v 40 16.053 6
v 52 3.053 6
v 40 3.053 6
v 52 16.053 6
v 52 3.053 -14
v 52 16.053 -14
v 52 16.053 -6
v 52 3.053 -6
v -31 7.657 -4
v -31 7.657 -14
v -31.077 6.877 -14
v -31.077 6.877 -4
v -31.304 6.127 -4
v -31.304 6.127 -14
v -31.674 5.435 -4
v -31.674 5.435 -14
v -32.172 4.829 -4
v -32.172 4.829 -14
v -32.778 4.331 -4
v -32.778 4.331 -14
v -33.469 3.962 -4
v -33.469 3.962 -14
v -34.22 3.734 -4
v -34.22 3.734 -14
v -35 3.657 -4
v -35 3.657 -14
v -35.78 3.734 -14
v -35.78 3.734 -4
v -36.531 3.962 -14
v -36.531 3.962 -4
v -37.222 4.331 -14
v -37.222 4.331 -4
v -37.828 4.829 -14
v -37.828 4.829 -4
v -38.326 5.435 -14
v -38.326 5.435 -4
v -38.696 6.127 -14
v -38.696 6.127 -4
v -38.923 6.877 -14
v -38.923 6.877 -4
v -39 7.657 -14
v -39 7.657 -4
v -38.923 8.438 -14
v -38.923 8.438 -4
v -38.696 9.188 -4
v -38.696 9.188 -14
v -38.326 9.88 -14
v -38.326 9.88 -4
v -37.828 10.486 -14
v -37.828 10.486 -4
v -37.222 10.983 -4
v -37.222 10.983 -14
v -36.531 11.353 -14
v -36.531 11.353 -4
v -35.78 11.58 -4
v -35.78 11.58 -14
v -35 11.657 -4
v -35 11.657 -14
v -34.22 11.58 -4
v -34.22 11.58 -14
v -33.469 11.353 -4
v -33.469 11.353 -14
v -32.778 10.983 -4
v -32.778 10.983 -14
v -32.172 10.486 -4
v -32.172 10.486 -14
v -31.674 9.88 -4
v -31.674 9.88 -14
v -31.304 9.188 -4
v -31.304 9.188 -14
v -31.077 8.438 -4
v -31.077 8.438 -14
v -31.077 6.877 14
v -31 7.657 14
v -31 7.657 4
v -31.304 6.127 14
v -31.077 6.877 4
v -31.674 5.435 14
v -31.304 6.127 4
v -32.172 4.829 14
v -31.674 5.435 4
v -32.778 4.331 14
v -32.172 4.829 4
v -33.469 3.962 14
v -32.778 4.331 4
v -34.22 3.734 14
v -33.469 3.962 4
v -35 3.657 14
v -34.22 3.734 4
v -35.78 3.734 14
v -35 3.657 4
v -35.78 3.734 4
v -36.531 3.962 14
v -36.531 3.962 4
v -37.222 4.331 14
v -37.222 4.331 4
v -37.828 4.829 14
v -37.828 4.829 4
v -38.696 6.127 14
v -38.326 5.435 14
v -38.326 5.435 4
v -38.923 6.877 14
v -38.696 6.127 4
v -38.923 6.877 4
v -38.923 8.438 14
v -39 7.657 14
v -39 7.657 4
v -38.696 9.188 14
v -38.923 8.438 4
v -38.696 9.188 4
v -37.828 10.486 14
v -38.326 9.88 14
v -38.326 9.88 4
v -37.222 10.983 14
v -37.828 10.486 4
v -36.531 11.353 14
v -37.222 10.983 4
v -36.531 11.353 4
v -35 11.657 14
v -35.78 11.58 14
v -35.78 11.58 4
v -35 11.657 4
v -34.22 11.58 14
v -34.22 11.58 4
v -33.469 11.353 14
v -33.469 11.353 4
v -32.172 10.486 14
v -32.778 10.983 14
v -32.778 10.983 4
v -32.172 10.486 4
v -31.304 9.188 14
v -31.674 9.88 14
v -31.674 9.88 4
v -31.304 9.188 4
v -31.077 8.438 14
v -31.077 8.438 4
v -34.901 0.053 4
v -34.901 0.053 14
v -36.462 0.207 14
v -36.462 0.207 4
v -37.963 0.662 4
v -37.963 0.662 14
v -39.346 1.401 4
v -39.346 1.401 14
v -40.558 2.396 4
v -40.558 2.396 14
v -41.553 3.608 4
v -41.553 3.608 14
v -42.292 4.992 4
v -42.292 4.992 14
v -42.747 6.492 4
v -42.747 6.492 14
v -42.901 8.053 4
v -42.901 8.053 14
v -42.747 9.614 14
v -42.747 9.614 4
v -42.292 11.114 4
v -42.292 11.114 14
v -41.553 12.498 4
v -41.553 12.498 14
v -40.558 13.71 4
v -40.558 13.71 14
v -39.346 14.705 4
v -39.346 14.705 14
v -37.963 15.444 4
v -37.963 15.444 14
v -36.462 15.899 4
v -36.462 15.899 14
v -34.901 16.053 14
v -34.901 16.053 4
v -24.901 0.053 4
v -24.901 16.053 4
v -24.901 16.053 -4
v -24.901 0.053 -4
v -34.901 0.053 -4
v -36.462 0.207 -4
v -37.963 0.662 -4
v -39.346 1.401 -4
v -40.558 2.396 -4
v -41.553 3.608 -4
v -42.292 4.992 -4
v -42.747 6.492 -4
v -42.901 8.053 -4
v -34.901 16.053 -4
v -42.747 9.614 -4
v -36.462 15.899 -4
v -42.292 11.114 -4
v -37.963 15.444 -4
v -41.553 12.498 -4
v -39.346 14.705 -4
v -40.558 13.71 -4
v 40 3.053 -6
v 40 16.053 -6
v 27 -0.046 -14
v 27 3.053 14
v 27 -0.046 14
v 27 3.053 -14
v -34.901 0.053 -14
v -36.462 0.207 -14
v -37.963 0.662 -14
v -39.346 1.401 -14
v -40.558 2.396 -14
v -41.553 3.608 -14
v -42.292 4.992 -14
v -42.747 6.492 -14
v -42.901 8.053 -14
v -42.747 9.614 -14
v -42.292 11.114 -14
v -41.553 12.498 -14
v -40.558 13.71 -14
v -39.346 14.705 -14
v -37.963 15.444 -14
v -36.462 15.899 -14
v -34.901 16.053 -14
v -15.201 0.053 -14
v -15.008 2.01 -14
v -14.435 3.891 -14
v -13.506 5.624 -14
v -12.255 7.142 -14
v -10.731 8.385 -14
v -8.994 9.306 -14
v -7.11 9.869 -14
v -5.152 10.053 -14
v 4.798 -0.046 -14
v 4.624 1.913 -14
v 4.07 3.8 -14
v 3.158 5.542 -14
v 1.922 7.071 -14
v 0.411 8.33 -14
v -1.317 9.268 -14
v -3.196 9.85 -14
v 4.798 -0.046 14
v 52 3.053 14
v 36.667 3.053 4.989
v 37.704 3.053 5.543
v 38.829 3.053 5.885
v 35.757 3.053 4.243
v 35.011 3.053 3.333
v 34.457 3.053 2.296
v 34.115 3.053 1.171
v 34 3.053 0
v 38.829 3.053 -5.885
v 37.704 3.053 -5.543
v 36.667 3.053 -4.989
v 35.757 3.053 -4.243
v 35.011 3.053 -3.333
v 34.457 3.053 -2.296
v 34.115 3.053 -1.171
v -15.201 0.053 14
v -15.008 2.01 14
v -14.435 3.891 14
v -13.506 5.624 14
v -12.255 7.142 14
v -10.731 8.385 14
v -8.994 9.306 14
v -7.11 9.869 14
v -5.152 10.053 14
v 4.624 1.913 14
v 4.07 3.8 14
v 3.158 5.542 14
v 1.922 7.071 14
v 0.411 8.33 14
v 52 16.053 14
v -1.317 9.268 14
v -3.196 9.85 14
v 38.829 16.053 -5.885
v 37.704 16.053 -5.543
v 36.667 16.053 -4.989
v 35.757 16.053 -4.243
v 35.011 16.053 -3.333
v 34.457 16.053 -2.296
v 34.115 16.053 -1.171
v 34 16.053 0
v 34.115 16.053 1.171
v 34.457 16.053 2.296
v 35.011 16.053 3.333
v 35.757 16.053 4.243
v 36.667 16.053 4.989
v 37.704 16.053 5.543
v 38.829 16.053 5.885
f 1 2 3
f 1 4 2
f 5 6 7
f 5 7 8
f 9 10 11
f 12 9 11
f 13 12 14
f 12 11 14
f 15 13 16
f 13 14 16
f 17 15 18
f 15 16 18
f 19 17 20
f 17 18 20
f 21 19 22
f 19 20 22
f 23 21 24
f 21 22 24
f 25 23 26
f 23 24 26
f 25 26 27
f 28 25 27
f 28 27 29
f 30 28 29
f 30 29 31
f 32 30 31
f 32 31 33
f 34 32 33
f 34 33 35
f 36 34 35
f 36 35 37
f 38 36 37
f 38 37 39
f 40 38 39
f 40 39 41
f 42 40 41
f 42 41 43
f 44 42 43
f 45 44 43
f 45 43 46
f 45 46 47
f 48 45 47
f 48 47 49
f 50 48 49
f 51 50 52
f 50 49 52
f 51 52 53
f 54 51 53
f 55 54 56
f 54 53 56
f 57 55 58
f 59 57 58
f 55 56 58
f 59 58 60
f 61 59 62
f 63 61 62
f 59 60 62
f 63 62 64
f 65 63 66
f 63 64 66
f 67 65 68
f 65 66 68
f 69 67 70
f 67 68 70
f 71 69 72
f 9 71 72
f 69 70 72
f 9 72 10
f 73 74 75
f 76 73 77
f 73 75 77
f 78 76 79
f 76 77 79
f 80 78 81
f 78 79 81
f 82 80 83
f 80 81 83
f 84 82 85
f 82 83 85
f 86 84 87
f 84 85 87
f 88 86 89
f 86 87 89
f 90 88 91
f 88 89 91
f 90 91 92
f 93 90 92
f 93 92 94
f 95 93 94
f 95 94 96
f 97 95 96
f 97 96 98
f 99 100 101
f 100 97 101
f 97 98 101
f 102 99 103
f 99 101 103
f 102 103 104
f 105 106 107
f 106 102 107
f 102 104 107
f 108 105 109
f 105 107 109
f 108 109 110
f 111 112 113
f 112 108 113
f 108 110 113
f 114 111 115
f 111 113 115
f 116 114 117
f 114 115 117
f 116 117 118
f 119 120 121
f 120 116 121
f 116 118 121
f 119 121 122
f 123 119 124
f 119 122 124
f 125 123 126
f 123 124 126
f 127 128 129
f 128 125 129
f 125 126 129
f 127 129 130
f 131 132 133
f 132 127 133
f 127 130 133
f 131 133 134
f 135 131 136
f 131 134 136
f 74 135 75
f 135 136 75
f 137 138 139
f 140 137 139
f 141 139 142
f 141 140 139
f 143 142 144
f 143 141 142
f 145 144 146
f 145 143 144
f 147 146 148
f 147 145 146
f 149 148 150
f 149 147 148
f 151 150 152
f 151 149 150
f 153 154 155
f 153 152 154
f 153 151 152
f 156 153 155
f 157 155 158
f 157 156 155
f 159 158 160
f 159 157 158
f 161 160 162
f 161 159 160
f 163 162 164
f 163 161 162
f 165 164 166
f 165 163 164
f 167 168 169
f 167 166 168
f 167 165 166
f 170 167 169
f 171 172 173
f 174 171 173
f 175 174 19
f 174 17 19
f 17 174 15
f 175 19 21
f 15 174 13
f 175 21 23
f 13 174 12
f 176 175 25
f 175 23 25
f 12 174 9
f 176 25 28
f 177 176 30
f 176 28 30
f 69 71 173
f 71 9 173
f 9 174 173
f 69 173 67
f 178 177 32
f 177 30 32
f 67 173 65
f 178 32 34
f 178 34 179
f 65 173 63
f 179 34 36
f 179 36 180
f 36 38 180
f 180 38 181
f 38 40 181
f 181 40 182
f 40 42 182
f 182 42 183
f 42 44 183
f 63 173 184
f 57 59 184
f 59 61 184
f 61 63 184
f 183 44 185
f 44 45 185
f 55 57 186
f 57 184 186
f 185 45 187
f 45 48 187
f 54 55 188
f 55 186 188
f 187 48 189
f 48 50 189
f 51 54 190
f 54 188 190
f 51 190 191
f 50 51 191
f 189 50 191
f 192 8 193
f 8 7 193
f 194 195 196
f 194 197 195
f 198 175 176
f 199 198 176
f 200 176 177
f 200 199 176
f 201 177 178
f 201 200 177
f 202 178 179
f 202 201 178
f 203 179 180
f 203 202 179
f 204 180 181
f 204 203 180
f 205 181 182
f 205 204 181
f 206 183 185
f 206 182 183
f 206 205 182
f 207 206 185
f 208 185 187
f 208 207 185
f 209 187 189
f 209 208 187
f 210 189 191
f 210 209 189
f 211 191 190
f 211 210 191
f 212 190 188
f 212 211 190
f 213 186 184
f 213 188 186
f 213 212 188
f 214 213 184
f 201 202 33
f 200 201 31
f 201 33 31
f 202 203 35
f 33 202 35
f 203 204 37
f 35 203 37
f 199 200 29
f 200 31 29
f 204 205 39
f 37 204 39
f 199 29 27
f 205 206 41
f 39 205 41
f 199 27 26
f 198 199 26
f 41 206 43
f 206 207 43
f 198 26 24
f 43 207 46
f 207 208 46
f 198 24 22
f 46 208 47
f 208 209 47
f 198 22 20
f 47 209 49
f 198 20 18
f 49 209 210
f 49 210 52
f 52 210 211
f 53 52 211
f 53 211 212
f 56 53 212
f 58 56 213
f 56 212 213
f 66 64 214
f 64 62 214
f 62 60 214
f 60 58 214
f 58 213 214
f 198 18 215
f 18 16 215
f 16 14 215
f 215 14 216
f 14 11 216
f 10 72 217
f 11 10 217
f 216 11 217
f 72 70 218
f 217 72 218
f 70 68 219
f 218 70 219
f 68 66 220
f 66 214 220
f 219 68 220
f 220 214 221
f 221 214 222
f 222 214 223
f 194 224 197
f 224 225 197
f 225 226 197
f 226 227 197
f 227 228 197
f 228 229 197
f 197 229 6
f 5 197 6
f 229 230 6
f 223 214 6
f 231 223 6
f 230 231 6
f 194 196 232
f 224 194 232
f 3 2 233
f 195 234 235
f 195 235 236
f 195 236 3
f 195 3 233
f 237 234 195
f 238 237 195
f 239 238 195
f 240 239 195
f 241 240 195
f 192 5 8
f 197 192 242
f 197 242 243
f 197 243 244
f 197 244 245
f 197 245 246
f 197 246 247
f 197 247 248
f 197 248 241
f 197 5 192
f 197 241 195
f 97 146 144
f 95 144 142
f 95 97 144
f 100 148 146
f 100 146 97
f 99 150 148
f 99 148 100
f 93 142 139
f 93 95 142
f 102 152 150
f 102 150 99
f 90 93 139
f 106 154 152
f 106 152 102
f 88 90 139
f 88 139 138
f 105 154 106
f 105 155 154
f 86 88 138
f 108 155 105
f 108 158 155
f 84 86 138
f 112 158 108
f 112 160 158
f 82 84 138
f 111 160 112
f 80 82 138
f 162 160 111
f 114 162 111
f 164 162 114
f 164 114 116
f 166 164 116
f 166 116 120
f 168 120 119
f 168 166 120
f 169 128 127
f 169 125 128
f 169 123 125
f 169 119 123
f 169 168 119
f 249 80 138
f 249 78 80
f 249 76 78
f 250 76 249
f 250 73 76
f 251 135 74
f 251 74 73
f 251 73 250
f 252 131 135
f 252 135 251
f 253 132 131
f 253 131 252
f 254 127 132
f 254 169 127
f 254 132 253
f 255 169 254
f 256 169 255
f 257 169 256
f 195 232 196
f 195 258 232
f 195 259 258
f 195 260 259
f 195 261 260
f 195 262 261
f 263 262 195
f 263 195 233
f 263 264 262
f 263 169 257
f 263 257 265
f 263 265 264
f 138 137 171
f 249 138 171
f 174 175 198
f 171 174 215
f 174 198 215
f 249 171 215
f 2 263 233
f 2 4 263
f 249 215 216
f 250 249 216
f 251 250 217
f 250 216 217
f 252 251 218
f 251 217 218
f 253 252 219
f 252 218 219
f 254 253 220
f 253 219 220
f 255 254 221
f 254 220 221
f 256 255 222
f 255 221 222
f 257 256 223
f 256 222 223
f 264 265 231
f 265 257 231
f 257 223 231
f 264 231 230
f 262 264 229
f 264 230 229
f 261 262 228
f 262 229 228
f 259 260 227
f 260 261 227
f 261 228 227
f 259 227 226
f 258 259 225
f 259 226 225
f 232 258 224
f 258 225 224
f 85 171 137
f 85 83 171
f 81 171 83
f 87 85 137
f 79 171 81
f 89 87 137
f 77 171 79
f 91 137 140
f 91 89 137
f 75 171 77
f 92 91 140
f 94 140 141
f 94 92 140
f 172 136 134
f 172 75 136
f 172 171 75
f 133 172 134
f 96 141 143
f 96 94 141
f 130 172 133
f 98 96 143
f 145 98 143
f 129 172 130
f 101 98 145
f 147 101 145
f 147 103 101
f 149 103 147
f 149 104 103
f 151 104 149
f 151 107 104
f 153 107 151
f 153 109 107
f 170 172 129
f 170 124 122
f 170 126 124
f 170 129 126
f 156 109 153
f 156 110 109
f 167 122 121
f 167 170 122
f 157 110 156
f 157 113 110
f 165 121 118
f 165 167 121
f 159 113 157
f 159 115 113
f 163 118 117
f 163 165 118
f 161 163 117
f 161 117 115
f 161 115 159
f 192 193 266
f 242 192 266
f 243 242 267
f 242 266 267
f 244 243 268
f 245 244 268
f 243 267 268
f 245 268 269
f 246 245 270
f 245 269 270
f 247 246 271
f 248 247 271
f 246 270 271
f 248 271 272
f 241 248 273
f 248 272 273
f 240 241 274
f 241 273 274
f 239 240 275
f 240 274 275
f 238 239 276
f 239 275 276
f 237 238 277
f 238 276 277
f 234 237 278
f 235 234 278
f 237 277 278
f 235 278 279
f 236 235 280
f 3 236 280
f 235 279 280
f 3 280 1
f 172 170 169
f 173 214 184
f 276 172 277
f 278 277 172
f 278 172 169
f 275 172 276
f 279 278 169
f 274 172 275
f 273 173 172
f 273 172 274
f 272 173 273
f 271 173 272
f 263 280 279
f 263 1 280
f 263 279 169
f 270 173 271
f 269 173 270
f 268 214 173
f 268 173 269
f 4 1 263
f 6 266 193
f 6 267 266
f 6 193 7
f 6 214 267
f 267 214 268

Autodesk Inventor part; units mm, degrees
ref_plane "YZ Plane" through (0, 0, 0) normal (1, 0, 0) x (0, 1, 0)
ref_plane "XZ Plane" through (0, 0, 0) normal (0, 1, 0) x (-1, 0, 0)
ref_plane "XY Plane" through (0, 0, 0) normal (0, 0, 1) x (1, 0, 0)
sketch "Szkic1" plane through (0, 0, 0) normal (0, 0, 1) x (1, 0, 0)
  line L0 (-28.581, 16.053) -> (52, 16.053)
  circle A0 centre (-35, 7.6573) radius 4
  line L1 (52, 16.053) -> (52, 3.053)
  line L2 (52, 3.053) -> (27, 3.053)
  line L3 (27, 3.053) -> (27, -0.0459)
  line L4 (27, -0.0459) -> (4.7982, -0.0459)
  arc A1 (4.7982, -0.0459) -> (-15.2013, 0.053) centre (-5.2013, 0.053) ccw
  line L5 (-28.581, 0.053) -> (-15.2013, 0.053)
  line L6 (-28.581, 0.053) -> (-34.9011, 0.053)
  line L7 (-28.581, 16.053) -> (-34.9011, 16.053)
  arc A2 (-34.9011, 16.053) -> (-34.9011, 0.053) centre (-34.9011, 8.053) ccw
  point P0 (0, 0)
  dimension "d1" = 8
  dimension "d2" = 20
  dimension "d3" = 25
  dimension "d4" = 52
  dimension "d6" = 13
  dimension "d7" = 87
  dimension "d8" = 16
extrude "Wyciągnięcie proste1" add sketch "Szkic1" along normal mid plane 28
sketch "Szkic2" plane through (-34.9011, 16.053, 14) normal (0, 1, 0) x (1, 0, 0)
  line L0 (0, 28) -> (86.9011, 28) construction
  line L1 (86.9011, 0) -> (0, 0) construction
  line L2 (86.9011, 28) -> (86.9011, 0) construction
  line L3 (0, 28) -> (-8, 28) construction
  line L4 (-8, 0) -> (0, 0) construction
  line L5 (-8, 28) -> (-8, 0) construction
  line L6 (-8, 28) -> (-8, 0) construction
  line L7 (-8, 28) -> (-8, 0) construction
  line L8 (-8, 28) -> (-8, 0) construction
  line L9 (-8, 28) -> (-8, 0) construction
  line L10 (-8, 28) -> (-8, 0) construction
  line L11 (-8, 28) -> (-8, 0) construction
  line L12 (-8, 28) -> (-8, 0) construction
  line L13 (-8, 28) -> (-8, 0) construction
  line L14 (-8, 28) -> (-8, 0) construction
  line L15 (-8, 28) -> (-8, 0) construction
  line L16 (-8, 28) -> (-8, 0) construction
  line L17 (-8, 28) -> (-8, 0) construction
  line L18 (-8, 28) -> (-8, 0) construction
  line L19 (0, 28) -> (0, 0) construction
  line L20 (86.9011, 20) -> (74.9011, 20)
  line L21 (86.9011, 8) -> (74.9011, 8)
  arc A0 (74.9011, 20) -> (74.9011, 8) centre (74.9011, 14) ccw
  line L22 (10, 10) -> (10, 18)
  line L23 (10, 18) -> (-8, 18)
  line L24 (3.9011, 0) -> (3.9011, 28) projected
  line L25 (10, 10) -> (-8, 10)
  line L26 (-8, 18) -> (-8, 10)
  line L27 (86.9011, 20) -> (86.9011, 8)
  point P0 (34.9011, 14)
  dimension "d12" = 12
  dimension "d13" = 40
  dimension "d15" = 8
  dimension "d16" = 18
extrude "Wyciągnięcie proste2" cut sketch "Szkic2" against normal through all
properties part number "Plyta dociskowa"
